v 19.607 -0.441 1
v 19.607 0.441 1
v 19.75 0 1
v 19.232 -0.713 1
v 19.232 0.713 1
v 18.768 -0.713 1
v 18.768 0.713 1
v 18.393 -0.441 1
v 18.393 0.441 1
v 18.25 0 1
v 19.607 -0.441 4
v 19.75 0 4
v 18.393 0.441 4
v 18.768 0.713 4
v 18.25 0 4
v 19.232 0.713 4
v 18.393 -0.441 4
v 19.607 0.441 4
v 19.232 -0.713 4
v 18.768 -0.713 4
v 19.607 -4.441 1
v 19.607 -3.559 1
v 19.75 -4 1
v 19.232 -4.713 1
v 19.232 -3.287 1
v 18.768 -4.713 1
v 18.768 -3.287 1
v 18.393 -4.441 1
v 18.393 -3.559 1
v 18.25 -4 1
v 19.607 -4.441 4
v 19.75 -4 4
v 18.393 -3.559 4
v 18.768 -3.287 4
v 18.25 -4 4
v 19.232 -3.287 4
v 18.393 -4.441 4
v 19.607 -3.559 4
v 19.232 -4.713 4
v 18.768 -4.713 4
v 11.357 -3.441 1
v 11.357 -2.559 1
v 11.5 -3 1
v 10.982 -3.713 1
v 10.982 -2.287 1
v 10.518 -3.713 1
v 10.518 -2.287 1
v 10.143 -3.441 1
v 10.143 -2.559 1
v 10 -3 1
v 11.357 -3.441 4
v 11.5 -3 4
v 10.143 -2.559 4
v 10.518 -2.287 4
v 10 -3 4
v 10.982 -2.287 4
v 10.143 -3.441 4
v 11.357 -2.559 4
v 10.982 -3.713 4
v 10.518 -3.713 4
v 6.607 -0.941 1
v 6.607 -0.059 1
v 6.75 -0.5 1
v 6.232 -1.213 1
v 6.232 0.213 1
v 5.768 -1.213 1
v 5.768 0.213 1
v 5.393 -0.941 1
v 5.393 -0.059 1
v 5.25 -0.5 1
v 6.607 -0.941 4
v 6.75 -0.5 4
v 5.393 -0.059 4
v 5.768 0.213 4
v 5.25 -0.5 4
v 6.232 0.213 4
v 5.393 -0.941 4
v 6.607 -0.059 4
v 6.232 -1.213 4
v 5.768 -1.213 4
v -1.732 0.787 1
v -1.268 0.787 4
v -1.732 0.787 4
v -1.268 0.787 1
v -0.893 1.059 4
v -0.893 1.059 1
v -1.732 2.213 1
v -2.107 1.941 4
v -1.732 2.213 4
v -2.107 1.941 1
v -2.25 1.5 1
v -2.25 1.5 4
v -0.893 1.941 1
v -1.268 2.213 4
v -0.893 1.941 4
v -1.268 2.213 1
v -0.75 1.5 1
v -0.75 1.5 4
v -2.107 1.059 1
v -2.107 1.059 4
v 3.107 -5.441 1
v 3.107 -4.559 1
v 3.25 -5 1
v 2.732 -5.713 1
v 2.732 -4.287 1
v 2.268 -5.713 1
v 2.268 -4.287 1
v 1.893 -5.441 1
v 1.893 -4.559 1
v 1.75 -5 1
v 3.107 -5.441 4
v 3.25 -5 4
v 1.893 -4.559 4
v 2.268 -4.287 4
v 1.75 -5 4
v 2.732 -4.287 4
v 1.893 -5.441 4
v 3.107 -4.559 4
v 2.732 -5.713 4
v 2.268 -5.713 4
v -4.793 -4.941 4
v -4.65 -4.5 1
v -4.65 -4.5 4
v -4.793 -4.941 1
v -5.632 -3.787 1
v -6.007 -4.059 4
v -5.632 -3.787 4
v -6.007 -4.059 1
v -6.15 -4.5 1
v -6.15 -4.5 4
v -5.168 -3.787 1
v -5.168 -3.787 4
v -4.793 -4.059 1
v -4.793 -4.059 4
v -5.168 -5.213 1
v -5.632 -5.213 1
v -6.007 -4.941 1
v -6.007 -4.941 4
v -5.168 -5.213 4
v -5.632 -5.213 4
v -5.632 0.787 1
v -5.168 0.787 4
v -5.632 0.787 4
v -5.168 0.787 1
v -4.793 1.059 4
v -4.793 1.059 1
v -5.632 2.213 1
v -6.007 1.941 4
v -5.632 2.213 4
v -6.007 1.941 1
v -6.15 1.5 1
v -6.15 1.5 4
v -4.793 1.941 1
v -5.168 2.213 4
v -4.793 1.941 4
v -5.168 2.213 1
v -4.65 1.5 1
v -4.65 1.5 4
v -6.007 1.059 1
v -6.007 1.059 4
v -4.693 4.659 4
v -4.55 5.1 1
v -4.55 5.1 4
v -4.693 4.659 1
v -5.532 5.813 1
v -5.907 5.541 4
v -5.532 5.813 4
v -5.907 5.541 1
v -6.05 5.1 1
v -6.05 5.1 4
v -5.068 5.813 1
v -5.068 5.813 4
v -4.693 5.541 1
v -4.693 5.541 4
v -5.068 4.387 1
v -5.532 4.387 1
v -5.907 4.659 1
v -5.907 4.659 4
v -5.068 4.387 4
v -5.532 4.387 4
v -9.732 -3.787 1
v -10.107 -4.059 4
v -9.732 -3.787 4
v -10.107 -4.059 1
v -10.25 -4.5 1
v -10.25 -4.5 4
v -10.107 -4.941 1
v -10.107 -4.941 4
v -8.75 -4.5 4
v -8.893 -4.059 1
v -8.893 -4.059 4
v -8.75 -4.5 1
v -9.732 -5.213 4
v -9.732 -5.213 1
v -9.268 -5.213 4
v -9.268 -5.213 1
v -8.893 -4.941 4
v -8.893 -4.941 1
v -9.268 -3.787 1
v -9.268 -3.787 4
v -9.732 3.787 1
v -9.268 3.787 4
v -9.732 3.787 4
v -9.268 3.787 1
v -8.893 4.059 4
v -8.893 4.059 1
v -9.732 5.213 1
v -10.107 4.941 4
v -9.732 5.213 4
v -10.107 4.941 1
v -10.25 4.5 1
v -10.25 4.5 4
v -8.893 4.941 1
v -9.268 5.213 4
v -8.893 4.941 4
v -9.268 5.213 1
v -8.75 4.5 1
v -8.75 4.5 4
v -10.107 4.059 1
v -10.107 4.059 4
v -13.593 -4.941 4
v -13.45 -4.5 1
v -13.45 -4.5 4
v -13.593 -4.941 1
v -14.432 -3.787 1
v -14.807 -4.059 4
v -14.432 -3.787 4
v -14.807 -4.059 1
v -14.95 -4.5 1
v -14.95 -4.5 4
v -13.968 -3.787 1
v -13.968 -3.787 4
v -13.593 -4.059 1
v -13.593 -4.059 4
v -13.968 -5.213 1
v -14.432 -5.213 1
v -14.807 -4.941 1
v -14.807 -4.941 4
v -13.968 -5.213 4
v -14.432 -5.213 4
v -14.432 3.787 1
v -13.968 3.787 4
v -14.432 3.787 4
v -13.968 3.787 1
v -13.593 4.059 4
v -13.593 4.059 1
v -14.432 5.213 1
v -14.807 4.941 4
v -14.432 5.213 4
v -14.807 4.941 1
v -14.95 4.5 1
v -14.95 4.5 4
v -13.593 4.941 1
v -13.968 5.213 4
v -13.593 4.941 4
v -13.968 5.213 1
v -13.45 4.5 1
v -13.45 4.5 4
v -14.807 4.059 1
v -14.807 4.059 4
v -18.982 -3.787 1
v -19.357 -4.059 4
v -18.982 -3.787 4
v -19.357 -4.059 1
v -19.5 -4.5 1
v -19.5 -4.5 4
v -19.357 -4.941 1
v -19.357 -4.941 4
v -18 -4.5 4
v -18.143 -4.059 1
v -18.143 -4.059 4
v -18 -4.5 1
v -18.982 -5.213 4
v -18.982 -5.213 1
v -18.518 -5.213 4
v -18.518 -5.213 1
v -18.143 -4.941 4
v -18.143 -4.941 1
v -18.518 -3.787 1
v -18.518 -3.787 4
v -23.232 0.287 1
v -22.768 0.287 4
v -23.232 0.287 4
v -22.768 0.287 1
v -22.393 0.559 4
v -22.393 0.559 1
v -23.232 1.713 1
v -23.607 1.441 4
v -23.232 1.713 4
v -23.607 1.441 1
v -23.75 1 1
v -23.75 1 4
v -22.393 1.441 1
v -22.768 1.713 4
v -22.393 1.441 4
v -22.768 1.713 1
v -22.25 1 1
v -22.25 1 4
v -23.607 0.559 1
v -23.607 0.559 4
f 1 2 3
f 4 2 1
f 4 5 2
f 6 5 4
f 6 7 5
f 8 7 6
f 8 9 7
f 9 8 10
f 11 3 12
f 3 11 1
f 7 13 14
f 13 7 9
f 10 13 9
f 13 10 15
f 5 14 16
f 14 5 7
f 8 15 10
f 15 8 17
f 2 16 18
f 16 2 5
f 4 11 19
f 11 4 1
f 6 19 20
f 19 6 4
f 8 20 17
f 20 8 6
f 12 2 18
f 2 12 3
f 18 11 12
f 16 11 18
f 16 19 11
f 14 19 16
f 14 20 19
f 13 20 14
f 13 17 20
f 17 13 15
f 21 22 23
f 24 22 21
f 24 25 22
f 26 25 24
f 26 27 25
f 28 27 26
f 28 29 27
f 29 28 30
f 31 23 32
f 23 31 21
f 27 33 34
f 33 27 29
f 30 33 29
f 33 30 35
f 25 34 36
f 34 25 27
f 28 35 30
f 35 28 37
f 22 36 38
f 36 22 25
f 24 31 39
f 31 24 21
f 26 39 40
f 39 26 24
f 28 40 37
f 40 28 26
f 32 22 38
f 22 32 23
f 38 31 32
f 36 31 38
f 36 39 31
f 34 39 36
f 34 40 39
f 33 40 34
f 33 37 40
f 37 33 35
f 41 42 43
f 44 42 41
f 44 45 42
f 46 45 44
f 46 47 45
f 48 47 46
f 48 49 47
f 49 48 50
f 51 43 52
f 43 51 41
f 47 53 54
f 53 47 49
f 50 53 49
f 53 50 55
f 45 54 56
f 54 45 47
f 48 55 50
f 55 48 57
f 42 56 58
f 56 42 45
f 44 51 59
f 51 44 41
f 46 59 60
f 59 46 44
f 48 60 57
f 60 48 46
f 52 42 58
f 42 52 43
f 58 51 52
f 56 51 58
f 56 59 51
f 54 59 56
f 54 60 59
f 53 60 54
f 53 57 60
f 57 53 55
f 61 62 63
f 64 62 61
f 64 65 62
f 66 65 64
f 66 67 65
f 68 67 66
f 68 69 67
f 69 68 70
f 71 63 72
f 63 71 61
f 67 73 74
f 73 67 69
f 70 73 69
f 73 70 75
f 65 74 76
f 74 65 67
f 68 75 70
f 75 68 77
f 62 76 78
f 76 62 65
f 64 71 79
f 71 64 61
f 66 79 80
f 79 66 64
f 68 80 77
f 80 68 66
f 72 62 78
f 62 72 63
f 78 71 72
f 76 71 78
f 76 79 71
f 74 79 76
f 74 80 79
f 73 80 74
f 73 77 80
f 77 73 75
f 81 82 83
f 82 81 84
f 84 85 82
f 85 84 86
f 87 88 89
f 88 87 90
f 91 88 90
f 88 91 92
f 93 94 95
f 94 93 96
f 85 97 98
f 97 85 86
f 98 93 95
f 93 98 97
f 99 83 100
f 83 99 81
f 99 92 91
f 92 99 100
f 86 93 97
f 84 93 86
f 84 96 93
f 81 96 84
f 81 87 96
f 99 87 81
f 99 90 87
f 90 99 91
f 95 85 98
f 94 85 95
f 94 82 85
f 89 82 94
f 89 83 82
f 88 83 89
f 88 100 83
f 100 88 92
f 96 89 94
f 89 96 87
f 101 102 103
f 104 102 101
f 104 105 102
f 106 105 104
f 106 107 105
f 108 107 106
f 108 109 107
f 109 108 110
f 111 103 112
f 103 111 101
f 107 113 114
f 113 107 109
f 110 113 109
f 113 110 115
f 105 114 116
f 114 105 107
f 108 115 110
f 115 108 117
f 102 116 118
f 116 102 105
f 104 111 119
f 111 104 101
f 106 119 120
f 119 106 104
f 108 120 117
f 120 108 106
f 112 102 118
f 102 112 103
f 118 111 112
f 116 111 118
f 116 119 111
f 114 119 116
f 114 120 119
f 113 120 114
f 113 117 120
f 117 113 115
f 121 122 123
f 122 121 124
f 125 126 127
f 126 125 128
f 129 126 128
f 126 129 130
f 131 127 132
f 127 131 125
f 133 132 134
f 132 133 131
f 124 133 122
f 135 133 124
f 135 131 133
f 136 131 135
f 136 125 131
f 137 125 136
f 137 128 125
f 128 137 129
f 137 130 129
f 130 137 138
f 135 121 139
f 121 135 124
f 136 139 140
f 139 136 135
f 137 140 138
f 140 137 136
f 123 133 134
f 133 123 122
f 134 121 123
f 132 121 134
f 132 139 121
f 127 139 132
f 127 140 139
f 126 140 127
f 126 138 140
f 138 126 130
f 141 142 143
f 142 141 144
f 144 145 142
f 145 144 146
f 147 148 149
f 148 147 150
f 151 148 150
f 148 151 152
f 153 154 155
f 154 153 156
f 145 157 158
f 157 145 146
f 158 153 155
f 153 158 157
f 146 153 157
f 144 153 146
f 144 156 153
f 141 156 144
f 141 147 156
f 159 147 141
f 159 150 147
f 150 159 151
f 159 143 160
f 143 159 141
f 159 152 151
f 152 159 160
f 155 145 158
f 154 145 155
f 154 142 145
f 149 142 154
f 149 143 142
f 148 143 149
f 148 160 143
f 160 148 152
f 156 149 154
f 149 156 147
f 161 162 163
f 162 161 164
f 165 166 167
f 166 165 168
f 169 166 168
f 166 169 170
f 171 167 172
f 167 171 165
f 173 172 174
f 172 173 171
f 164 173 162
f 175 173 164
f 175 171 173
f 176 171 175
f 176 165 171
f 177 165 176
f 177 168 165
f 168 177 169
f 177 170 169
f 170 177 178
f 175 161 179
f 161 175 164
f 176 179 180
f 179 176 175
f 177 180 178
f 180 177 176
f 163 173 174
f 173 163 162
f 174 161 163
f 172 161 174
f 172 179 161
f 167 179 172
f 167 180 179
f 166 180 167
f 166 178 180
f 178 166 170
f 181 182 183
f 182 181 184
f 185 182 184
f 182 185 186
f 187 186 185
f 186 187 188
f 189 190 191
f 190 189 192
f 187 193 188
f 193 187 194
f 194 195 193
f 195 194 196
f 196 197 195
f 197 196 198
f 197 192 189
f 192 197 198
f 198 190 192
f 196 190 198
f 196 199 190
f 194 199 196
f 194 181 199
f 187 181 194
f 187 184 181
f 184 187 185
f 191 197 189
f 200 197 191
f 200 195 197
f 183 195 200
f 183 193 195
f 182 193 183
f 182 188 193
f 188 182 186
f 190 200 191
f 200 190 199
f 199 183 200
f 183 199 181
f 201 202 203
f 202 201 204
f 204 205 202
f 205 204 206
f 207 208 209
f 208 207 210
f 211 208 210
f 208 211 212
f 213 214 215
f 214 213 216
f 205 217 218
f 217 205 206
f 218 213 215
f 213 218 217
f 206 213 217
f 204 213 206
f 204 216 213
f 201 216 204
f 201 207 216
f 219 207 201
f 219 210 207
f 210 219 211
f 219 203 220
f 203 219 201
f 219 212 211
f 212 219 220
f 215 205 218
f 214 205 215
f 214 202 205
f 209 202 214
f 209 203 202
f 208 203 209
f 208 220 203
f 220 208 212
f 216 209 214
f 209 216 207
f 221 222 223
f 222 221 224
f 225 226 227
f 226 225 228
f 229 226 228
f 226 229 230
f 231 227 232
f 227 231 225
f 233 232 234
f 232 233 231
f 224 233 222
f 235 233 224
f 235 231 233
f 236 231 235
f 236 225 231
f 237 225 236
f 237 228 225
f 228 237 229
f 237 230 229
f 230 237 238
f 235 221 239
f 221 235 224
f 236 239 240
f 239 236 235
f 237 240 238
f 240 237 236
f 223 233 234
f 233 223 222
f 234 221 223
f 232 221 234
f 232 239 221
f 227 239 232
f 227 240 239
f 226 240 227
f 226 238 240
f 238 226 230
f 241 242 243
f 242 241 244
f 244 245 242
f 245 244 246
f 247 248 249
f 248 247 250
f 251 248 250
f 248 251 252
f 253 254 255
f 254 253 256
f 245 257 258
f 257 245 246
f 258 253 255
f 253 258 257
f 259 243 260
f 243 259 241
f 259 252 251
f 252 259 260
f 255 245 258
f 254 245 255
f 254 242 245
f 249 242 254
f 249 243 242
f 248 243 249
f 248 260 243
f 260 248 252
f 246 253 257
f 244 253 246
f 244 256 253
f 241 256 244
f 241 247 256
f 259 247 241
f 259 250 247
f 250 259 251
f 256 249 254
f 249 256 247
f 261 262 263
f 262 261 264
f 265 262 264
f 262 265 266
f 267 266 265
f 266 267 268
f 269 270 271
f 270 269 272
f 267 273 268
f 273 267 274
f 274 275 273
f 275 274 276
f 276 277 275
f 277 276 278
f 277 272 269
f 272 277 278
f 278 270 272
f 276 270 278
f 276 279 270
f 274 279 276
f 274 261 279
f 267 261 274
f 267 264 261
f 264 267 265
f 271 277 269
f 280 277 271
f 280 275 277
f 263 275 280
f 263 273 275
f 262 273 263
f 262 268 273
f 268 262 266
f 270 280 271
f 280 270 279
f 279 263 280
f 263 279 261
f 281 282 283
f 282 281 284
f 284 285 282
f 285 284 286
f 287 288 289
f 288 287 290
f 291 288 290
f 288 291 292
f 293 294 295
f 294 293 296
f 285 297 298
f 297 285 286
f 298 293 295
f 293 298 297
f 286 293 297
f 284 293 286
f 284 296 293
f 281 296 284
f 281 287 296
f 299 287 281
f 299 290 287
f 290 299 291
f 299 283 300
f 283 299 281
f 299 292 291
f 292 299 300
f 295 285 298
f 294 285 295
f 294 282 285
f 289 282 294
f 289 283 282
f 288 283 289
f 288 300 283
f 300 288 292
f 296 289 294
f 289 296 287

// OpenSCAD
// file: snaps.scad
module pinshape(r=5,bellend=6,h=20) {
	union() {
		cylinder(r=r,h=h);
		translate([0,0,h]) sphere(r = bellend);
		}
}


module pin (h=20) {
	difference () {
		pinshape(h=h);
		translate([-10,3,h-7]) cube([20,10,30]);
		translate([-10,-13,h-7]) cube([20,10,30]);
		translate([-10,-10,h+4]) cube([20,20,10]);
		translate([0,10,6]) rotate([90, 0, 0]) linear_extrude(height=20) polygon(points=[[0,0],[-10,100],[10,100]],paths=[ [0,1,2] ]);
	}
}

module pinhole (h=20) {
		pinshape(r=5.25,bellend=6.25,h=h);
}

union () {
	translate([0,0,1]) pin(h=21);
	translate([-7.5,-7.5,0]) cube([15,15,2]);
}

/*
translate([18,0,27.25]) rotate([0,180,0]) difference () {
	cylinder(r=7.25, h=27.27);
	translate([0,0,-1]) pinhole();
}
*/
// file: mozlove.scad
use <snaps.scad>

module _pegs(r=0.75) {
	translate([-19,0,0]) cylinder(h=3,r=r, $fn=10);
	translate([-19,-4,0]) cylinder(h=3,r=r, $fn=10);
	translate([-10.75,-3,0]) cylinder(h=3,r=r, $fn=10);
	translate([-6,-0.5,0]) cylinder(h=3,r=r, $fn=10);
	translate([1.5,1.5,0]) cylinder(h=3,r=r, $fn=10);
	translate([-2.5,-5,0]) cylinder(h=3,r=r, $fn=10);
	translate([5.4,-4.5,0]) cylinder(h=3,r=r, $fn=10);
	translate([5.4,1.5,0]) cylinder(h=3,r=r, $fn=10);
	translate([5.3,5.1,0]) cylinder(h=3,r=r, $fn=10);
	translate([9.5,-4.5,0]) cylinder(h=3,r=r, $fn=10);
	translate([9.5,4.5,0]) cylinder(h=3,r=r, $fn=10);
	translate([14.2,-4.5,0]) cylinder(h=3,r=r, $fn=10);
	translate([14.2,4.5,0]) cylinder(h=3,r=r, $fn=10);
	translate([18.75,-4.5,0]) cylinder(h=3,r=r, $fn=10);
	translate([23,1,0]) cylinder(h=3,r=r, $fn=10);
}

module mozilla(h=4, pegs=true) {
	width = 50;
	height = 13;
	union () {
		color("white") translate([width/-2,height/-2,0]) linear_extrude(height = h, convexity = 10)
		resize(newsize=[width,height,0])
		import (file = "mozilla.dxf");
		if (pegs) {
			translate([0,0,-1])  _pegs();
		}
	}
}

module heart(width=70.25, height=58.25, depth=15) {
	linear_extrude(height = depth, convexity = 10)
	translate([width/-2, height/-2, 0]) resize(newsize=[width,height,0])
	import (file = "heart.dxf");
}

module heart_inset(width=65.775, height=53.581, depth=15) {
	linear_extrude(height = depth, convexity = 10)
	translate([width/-2, height/-2, 0]) resize(newsize=[width,height,0])
	import (file = "heart_inset.dxf");
}

module top_lid(pegs=true) {
	color ("red") difference () {
		union () {
			difference () {
				heart(depth=7);
				translate([0, 0, -0.5]) heart_inset(depth=5.5);
				if (pegs) {
					translate([0, 7.5, 6]) _pegs(r=1);
				} else {
					translate([0, 7.5, 6]) mozilla(pegs=false);
				}
			}
			//translate([0,-21.5,0]) pinplace();
			translate([-3.5, 13.5, 0]) cube([7,7,6]);
			translate([0,-20,2]) rotate([0,180,0]) pin(h=21);
			translate([0,-20,0]) cylinder(r=7.25, h=6);
		}
		translate([-2.75,14.25,-0.5]) cube([5.5,5.5,6]);
	}
}

module box_body() {
	color ("red") difference () {
		union () {
			difference () {
				heart(depth=30);
				translate([0, 0, 3]) heart_inset(depth=30);
			}
			translate([-3.5, 13.5, 1]) cube([7,7,29]);
			translate([0,-20,1]) cylinder(r=7.25, h=29);

		}
		translate([-2.75,14.25,24.5]) cube([5.5,5.5,6]);
		translate([0, -20, 31]) rotate([0,180,0]) pinhole();
	}
}

//box_body();
top_lid();
//translate([-25,2,36]) mozilla(height=4);
//mozilla();

//experiment();
//translate([-25, -45, 0])  mozilla(height=5);
// main file
use <mozlove.scad>

translate([0,0,3]) rotate([0,180,0]) mozilla(h=3);
